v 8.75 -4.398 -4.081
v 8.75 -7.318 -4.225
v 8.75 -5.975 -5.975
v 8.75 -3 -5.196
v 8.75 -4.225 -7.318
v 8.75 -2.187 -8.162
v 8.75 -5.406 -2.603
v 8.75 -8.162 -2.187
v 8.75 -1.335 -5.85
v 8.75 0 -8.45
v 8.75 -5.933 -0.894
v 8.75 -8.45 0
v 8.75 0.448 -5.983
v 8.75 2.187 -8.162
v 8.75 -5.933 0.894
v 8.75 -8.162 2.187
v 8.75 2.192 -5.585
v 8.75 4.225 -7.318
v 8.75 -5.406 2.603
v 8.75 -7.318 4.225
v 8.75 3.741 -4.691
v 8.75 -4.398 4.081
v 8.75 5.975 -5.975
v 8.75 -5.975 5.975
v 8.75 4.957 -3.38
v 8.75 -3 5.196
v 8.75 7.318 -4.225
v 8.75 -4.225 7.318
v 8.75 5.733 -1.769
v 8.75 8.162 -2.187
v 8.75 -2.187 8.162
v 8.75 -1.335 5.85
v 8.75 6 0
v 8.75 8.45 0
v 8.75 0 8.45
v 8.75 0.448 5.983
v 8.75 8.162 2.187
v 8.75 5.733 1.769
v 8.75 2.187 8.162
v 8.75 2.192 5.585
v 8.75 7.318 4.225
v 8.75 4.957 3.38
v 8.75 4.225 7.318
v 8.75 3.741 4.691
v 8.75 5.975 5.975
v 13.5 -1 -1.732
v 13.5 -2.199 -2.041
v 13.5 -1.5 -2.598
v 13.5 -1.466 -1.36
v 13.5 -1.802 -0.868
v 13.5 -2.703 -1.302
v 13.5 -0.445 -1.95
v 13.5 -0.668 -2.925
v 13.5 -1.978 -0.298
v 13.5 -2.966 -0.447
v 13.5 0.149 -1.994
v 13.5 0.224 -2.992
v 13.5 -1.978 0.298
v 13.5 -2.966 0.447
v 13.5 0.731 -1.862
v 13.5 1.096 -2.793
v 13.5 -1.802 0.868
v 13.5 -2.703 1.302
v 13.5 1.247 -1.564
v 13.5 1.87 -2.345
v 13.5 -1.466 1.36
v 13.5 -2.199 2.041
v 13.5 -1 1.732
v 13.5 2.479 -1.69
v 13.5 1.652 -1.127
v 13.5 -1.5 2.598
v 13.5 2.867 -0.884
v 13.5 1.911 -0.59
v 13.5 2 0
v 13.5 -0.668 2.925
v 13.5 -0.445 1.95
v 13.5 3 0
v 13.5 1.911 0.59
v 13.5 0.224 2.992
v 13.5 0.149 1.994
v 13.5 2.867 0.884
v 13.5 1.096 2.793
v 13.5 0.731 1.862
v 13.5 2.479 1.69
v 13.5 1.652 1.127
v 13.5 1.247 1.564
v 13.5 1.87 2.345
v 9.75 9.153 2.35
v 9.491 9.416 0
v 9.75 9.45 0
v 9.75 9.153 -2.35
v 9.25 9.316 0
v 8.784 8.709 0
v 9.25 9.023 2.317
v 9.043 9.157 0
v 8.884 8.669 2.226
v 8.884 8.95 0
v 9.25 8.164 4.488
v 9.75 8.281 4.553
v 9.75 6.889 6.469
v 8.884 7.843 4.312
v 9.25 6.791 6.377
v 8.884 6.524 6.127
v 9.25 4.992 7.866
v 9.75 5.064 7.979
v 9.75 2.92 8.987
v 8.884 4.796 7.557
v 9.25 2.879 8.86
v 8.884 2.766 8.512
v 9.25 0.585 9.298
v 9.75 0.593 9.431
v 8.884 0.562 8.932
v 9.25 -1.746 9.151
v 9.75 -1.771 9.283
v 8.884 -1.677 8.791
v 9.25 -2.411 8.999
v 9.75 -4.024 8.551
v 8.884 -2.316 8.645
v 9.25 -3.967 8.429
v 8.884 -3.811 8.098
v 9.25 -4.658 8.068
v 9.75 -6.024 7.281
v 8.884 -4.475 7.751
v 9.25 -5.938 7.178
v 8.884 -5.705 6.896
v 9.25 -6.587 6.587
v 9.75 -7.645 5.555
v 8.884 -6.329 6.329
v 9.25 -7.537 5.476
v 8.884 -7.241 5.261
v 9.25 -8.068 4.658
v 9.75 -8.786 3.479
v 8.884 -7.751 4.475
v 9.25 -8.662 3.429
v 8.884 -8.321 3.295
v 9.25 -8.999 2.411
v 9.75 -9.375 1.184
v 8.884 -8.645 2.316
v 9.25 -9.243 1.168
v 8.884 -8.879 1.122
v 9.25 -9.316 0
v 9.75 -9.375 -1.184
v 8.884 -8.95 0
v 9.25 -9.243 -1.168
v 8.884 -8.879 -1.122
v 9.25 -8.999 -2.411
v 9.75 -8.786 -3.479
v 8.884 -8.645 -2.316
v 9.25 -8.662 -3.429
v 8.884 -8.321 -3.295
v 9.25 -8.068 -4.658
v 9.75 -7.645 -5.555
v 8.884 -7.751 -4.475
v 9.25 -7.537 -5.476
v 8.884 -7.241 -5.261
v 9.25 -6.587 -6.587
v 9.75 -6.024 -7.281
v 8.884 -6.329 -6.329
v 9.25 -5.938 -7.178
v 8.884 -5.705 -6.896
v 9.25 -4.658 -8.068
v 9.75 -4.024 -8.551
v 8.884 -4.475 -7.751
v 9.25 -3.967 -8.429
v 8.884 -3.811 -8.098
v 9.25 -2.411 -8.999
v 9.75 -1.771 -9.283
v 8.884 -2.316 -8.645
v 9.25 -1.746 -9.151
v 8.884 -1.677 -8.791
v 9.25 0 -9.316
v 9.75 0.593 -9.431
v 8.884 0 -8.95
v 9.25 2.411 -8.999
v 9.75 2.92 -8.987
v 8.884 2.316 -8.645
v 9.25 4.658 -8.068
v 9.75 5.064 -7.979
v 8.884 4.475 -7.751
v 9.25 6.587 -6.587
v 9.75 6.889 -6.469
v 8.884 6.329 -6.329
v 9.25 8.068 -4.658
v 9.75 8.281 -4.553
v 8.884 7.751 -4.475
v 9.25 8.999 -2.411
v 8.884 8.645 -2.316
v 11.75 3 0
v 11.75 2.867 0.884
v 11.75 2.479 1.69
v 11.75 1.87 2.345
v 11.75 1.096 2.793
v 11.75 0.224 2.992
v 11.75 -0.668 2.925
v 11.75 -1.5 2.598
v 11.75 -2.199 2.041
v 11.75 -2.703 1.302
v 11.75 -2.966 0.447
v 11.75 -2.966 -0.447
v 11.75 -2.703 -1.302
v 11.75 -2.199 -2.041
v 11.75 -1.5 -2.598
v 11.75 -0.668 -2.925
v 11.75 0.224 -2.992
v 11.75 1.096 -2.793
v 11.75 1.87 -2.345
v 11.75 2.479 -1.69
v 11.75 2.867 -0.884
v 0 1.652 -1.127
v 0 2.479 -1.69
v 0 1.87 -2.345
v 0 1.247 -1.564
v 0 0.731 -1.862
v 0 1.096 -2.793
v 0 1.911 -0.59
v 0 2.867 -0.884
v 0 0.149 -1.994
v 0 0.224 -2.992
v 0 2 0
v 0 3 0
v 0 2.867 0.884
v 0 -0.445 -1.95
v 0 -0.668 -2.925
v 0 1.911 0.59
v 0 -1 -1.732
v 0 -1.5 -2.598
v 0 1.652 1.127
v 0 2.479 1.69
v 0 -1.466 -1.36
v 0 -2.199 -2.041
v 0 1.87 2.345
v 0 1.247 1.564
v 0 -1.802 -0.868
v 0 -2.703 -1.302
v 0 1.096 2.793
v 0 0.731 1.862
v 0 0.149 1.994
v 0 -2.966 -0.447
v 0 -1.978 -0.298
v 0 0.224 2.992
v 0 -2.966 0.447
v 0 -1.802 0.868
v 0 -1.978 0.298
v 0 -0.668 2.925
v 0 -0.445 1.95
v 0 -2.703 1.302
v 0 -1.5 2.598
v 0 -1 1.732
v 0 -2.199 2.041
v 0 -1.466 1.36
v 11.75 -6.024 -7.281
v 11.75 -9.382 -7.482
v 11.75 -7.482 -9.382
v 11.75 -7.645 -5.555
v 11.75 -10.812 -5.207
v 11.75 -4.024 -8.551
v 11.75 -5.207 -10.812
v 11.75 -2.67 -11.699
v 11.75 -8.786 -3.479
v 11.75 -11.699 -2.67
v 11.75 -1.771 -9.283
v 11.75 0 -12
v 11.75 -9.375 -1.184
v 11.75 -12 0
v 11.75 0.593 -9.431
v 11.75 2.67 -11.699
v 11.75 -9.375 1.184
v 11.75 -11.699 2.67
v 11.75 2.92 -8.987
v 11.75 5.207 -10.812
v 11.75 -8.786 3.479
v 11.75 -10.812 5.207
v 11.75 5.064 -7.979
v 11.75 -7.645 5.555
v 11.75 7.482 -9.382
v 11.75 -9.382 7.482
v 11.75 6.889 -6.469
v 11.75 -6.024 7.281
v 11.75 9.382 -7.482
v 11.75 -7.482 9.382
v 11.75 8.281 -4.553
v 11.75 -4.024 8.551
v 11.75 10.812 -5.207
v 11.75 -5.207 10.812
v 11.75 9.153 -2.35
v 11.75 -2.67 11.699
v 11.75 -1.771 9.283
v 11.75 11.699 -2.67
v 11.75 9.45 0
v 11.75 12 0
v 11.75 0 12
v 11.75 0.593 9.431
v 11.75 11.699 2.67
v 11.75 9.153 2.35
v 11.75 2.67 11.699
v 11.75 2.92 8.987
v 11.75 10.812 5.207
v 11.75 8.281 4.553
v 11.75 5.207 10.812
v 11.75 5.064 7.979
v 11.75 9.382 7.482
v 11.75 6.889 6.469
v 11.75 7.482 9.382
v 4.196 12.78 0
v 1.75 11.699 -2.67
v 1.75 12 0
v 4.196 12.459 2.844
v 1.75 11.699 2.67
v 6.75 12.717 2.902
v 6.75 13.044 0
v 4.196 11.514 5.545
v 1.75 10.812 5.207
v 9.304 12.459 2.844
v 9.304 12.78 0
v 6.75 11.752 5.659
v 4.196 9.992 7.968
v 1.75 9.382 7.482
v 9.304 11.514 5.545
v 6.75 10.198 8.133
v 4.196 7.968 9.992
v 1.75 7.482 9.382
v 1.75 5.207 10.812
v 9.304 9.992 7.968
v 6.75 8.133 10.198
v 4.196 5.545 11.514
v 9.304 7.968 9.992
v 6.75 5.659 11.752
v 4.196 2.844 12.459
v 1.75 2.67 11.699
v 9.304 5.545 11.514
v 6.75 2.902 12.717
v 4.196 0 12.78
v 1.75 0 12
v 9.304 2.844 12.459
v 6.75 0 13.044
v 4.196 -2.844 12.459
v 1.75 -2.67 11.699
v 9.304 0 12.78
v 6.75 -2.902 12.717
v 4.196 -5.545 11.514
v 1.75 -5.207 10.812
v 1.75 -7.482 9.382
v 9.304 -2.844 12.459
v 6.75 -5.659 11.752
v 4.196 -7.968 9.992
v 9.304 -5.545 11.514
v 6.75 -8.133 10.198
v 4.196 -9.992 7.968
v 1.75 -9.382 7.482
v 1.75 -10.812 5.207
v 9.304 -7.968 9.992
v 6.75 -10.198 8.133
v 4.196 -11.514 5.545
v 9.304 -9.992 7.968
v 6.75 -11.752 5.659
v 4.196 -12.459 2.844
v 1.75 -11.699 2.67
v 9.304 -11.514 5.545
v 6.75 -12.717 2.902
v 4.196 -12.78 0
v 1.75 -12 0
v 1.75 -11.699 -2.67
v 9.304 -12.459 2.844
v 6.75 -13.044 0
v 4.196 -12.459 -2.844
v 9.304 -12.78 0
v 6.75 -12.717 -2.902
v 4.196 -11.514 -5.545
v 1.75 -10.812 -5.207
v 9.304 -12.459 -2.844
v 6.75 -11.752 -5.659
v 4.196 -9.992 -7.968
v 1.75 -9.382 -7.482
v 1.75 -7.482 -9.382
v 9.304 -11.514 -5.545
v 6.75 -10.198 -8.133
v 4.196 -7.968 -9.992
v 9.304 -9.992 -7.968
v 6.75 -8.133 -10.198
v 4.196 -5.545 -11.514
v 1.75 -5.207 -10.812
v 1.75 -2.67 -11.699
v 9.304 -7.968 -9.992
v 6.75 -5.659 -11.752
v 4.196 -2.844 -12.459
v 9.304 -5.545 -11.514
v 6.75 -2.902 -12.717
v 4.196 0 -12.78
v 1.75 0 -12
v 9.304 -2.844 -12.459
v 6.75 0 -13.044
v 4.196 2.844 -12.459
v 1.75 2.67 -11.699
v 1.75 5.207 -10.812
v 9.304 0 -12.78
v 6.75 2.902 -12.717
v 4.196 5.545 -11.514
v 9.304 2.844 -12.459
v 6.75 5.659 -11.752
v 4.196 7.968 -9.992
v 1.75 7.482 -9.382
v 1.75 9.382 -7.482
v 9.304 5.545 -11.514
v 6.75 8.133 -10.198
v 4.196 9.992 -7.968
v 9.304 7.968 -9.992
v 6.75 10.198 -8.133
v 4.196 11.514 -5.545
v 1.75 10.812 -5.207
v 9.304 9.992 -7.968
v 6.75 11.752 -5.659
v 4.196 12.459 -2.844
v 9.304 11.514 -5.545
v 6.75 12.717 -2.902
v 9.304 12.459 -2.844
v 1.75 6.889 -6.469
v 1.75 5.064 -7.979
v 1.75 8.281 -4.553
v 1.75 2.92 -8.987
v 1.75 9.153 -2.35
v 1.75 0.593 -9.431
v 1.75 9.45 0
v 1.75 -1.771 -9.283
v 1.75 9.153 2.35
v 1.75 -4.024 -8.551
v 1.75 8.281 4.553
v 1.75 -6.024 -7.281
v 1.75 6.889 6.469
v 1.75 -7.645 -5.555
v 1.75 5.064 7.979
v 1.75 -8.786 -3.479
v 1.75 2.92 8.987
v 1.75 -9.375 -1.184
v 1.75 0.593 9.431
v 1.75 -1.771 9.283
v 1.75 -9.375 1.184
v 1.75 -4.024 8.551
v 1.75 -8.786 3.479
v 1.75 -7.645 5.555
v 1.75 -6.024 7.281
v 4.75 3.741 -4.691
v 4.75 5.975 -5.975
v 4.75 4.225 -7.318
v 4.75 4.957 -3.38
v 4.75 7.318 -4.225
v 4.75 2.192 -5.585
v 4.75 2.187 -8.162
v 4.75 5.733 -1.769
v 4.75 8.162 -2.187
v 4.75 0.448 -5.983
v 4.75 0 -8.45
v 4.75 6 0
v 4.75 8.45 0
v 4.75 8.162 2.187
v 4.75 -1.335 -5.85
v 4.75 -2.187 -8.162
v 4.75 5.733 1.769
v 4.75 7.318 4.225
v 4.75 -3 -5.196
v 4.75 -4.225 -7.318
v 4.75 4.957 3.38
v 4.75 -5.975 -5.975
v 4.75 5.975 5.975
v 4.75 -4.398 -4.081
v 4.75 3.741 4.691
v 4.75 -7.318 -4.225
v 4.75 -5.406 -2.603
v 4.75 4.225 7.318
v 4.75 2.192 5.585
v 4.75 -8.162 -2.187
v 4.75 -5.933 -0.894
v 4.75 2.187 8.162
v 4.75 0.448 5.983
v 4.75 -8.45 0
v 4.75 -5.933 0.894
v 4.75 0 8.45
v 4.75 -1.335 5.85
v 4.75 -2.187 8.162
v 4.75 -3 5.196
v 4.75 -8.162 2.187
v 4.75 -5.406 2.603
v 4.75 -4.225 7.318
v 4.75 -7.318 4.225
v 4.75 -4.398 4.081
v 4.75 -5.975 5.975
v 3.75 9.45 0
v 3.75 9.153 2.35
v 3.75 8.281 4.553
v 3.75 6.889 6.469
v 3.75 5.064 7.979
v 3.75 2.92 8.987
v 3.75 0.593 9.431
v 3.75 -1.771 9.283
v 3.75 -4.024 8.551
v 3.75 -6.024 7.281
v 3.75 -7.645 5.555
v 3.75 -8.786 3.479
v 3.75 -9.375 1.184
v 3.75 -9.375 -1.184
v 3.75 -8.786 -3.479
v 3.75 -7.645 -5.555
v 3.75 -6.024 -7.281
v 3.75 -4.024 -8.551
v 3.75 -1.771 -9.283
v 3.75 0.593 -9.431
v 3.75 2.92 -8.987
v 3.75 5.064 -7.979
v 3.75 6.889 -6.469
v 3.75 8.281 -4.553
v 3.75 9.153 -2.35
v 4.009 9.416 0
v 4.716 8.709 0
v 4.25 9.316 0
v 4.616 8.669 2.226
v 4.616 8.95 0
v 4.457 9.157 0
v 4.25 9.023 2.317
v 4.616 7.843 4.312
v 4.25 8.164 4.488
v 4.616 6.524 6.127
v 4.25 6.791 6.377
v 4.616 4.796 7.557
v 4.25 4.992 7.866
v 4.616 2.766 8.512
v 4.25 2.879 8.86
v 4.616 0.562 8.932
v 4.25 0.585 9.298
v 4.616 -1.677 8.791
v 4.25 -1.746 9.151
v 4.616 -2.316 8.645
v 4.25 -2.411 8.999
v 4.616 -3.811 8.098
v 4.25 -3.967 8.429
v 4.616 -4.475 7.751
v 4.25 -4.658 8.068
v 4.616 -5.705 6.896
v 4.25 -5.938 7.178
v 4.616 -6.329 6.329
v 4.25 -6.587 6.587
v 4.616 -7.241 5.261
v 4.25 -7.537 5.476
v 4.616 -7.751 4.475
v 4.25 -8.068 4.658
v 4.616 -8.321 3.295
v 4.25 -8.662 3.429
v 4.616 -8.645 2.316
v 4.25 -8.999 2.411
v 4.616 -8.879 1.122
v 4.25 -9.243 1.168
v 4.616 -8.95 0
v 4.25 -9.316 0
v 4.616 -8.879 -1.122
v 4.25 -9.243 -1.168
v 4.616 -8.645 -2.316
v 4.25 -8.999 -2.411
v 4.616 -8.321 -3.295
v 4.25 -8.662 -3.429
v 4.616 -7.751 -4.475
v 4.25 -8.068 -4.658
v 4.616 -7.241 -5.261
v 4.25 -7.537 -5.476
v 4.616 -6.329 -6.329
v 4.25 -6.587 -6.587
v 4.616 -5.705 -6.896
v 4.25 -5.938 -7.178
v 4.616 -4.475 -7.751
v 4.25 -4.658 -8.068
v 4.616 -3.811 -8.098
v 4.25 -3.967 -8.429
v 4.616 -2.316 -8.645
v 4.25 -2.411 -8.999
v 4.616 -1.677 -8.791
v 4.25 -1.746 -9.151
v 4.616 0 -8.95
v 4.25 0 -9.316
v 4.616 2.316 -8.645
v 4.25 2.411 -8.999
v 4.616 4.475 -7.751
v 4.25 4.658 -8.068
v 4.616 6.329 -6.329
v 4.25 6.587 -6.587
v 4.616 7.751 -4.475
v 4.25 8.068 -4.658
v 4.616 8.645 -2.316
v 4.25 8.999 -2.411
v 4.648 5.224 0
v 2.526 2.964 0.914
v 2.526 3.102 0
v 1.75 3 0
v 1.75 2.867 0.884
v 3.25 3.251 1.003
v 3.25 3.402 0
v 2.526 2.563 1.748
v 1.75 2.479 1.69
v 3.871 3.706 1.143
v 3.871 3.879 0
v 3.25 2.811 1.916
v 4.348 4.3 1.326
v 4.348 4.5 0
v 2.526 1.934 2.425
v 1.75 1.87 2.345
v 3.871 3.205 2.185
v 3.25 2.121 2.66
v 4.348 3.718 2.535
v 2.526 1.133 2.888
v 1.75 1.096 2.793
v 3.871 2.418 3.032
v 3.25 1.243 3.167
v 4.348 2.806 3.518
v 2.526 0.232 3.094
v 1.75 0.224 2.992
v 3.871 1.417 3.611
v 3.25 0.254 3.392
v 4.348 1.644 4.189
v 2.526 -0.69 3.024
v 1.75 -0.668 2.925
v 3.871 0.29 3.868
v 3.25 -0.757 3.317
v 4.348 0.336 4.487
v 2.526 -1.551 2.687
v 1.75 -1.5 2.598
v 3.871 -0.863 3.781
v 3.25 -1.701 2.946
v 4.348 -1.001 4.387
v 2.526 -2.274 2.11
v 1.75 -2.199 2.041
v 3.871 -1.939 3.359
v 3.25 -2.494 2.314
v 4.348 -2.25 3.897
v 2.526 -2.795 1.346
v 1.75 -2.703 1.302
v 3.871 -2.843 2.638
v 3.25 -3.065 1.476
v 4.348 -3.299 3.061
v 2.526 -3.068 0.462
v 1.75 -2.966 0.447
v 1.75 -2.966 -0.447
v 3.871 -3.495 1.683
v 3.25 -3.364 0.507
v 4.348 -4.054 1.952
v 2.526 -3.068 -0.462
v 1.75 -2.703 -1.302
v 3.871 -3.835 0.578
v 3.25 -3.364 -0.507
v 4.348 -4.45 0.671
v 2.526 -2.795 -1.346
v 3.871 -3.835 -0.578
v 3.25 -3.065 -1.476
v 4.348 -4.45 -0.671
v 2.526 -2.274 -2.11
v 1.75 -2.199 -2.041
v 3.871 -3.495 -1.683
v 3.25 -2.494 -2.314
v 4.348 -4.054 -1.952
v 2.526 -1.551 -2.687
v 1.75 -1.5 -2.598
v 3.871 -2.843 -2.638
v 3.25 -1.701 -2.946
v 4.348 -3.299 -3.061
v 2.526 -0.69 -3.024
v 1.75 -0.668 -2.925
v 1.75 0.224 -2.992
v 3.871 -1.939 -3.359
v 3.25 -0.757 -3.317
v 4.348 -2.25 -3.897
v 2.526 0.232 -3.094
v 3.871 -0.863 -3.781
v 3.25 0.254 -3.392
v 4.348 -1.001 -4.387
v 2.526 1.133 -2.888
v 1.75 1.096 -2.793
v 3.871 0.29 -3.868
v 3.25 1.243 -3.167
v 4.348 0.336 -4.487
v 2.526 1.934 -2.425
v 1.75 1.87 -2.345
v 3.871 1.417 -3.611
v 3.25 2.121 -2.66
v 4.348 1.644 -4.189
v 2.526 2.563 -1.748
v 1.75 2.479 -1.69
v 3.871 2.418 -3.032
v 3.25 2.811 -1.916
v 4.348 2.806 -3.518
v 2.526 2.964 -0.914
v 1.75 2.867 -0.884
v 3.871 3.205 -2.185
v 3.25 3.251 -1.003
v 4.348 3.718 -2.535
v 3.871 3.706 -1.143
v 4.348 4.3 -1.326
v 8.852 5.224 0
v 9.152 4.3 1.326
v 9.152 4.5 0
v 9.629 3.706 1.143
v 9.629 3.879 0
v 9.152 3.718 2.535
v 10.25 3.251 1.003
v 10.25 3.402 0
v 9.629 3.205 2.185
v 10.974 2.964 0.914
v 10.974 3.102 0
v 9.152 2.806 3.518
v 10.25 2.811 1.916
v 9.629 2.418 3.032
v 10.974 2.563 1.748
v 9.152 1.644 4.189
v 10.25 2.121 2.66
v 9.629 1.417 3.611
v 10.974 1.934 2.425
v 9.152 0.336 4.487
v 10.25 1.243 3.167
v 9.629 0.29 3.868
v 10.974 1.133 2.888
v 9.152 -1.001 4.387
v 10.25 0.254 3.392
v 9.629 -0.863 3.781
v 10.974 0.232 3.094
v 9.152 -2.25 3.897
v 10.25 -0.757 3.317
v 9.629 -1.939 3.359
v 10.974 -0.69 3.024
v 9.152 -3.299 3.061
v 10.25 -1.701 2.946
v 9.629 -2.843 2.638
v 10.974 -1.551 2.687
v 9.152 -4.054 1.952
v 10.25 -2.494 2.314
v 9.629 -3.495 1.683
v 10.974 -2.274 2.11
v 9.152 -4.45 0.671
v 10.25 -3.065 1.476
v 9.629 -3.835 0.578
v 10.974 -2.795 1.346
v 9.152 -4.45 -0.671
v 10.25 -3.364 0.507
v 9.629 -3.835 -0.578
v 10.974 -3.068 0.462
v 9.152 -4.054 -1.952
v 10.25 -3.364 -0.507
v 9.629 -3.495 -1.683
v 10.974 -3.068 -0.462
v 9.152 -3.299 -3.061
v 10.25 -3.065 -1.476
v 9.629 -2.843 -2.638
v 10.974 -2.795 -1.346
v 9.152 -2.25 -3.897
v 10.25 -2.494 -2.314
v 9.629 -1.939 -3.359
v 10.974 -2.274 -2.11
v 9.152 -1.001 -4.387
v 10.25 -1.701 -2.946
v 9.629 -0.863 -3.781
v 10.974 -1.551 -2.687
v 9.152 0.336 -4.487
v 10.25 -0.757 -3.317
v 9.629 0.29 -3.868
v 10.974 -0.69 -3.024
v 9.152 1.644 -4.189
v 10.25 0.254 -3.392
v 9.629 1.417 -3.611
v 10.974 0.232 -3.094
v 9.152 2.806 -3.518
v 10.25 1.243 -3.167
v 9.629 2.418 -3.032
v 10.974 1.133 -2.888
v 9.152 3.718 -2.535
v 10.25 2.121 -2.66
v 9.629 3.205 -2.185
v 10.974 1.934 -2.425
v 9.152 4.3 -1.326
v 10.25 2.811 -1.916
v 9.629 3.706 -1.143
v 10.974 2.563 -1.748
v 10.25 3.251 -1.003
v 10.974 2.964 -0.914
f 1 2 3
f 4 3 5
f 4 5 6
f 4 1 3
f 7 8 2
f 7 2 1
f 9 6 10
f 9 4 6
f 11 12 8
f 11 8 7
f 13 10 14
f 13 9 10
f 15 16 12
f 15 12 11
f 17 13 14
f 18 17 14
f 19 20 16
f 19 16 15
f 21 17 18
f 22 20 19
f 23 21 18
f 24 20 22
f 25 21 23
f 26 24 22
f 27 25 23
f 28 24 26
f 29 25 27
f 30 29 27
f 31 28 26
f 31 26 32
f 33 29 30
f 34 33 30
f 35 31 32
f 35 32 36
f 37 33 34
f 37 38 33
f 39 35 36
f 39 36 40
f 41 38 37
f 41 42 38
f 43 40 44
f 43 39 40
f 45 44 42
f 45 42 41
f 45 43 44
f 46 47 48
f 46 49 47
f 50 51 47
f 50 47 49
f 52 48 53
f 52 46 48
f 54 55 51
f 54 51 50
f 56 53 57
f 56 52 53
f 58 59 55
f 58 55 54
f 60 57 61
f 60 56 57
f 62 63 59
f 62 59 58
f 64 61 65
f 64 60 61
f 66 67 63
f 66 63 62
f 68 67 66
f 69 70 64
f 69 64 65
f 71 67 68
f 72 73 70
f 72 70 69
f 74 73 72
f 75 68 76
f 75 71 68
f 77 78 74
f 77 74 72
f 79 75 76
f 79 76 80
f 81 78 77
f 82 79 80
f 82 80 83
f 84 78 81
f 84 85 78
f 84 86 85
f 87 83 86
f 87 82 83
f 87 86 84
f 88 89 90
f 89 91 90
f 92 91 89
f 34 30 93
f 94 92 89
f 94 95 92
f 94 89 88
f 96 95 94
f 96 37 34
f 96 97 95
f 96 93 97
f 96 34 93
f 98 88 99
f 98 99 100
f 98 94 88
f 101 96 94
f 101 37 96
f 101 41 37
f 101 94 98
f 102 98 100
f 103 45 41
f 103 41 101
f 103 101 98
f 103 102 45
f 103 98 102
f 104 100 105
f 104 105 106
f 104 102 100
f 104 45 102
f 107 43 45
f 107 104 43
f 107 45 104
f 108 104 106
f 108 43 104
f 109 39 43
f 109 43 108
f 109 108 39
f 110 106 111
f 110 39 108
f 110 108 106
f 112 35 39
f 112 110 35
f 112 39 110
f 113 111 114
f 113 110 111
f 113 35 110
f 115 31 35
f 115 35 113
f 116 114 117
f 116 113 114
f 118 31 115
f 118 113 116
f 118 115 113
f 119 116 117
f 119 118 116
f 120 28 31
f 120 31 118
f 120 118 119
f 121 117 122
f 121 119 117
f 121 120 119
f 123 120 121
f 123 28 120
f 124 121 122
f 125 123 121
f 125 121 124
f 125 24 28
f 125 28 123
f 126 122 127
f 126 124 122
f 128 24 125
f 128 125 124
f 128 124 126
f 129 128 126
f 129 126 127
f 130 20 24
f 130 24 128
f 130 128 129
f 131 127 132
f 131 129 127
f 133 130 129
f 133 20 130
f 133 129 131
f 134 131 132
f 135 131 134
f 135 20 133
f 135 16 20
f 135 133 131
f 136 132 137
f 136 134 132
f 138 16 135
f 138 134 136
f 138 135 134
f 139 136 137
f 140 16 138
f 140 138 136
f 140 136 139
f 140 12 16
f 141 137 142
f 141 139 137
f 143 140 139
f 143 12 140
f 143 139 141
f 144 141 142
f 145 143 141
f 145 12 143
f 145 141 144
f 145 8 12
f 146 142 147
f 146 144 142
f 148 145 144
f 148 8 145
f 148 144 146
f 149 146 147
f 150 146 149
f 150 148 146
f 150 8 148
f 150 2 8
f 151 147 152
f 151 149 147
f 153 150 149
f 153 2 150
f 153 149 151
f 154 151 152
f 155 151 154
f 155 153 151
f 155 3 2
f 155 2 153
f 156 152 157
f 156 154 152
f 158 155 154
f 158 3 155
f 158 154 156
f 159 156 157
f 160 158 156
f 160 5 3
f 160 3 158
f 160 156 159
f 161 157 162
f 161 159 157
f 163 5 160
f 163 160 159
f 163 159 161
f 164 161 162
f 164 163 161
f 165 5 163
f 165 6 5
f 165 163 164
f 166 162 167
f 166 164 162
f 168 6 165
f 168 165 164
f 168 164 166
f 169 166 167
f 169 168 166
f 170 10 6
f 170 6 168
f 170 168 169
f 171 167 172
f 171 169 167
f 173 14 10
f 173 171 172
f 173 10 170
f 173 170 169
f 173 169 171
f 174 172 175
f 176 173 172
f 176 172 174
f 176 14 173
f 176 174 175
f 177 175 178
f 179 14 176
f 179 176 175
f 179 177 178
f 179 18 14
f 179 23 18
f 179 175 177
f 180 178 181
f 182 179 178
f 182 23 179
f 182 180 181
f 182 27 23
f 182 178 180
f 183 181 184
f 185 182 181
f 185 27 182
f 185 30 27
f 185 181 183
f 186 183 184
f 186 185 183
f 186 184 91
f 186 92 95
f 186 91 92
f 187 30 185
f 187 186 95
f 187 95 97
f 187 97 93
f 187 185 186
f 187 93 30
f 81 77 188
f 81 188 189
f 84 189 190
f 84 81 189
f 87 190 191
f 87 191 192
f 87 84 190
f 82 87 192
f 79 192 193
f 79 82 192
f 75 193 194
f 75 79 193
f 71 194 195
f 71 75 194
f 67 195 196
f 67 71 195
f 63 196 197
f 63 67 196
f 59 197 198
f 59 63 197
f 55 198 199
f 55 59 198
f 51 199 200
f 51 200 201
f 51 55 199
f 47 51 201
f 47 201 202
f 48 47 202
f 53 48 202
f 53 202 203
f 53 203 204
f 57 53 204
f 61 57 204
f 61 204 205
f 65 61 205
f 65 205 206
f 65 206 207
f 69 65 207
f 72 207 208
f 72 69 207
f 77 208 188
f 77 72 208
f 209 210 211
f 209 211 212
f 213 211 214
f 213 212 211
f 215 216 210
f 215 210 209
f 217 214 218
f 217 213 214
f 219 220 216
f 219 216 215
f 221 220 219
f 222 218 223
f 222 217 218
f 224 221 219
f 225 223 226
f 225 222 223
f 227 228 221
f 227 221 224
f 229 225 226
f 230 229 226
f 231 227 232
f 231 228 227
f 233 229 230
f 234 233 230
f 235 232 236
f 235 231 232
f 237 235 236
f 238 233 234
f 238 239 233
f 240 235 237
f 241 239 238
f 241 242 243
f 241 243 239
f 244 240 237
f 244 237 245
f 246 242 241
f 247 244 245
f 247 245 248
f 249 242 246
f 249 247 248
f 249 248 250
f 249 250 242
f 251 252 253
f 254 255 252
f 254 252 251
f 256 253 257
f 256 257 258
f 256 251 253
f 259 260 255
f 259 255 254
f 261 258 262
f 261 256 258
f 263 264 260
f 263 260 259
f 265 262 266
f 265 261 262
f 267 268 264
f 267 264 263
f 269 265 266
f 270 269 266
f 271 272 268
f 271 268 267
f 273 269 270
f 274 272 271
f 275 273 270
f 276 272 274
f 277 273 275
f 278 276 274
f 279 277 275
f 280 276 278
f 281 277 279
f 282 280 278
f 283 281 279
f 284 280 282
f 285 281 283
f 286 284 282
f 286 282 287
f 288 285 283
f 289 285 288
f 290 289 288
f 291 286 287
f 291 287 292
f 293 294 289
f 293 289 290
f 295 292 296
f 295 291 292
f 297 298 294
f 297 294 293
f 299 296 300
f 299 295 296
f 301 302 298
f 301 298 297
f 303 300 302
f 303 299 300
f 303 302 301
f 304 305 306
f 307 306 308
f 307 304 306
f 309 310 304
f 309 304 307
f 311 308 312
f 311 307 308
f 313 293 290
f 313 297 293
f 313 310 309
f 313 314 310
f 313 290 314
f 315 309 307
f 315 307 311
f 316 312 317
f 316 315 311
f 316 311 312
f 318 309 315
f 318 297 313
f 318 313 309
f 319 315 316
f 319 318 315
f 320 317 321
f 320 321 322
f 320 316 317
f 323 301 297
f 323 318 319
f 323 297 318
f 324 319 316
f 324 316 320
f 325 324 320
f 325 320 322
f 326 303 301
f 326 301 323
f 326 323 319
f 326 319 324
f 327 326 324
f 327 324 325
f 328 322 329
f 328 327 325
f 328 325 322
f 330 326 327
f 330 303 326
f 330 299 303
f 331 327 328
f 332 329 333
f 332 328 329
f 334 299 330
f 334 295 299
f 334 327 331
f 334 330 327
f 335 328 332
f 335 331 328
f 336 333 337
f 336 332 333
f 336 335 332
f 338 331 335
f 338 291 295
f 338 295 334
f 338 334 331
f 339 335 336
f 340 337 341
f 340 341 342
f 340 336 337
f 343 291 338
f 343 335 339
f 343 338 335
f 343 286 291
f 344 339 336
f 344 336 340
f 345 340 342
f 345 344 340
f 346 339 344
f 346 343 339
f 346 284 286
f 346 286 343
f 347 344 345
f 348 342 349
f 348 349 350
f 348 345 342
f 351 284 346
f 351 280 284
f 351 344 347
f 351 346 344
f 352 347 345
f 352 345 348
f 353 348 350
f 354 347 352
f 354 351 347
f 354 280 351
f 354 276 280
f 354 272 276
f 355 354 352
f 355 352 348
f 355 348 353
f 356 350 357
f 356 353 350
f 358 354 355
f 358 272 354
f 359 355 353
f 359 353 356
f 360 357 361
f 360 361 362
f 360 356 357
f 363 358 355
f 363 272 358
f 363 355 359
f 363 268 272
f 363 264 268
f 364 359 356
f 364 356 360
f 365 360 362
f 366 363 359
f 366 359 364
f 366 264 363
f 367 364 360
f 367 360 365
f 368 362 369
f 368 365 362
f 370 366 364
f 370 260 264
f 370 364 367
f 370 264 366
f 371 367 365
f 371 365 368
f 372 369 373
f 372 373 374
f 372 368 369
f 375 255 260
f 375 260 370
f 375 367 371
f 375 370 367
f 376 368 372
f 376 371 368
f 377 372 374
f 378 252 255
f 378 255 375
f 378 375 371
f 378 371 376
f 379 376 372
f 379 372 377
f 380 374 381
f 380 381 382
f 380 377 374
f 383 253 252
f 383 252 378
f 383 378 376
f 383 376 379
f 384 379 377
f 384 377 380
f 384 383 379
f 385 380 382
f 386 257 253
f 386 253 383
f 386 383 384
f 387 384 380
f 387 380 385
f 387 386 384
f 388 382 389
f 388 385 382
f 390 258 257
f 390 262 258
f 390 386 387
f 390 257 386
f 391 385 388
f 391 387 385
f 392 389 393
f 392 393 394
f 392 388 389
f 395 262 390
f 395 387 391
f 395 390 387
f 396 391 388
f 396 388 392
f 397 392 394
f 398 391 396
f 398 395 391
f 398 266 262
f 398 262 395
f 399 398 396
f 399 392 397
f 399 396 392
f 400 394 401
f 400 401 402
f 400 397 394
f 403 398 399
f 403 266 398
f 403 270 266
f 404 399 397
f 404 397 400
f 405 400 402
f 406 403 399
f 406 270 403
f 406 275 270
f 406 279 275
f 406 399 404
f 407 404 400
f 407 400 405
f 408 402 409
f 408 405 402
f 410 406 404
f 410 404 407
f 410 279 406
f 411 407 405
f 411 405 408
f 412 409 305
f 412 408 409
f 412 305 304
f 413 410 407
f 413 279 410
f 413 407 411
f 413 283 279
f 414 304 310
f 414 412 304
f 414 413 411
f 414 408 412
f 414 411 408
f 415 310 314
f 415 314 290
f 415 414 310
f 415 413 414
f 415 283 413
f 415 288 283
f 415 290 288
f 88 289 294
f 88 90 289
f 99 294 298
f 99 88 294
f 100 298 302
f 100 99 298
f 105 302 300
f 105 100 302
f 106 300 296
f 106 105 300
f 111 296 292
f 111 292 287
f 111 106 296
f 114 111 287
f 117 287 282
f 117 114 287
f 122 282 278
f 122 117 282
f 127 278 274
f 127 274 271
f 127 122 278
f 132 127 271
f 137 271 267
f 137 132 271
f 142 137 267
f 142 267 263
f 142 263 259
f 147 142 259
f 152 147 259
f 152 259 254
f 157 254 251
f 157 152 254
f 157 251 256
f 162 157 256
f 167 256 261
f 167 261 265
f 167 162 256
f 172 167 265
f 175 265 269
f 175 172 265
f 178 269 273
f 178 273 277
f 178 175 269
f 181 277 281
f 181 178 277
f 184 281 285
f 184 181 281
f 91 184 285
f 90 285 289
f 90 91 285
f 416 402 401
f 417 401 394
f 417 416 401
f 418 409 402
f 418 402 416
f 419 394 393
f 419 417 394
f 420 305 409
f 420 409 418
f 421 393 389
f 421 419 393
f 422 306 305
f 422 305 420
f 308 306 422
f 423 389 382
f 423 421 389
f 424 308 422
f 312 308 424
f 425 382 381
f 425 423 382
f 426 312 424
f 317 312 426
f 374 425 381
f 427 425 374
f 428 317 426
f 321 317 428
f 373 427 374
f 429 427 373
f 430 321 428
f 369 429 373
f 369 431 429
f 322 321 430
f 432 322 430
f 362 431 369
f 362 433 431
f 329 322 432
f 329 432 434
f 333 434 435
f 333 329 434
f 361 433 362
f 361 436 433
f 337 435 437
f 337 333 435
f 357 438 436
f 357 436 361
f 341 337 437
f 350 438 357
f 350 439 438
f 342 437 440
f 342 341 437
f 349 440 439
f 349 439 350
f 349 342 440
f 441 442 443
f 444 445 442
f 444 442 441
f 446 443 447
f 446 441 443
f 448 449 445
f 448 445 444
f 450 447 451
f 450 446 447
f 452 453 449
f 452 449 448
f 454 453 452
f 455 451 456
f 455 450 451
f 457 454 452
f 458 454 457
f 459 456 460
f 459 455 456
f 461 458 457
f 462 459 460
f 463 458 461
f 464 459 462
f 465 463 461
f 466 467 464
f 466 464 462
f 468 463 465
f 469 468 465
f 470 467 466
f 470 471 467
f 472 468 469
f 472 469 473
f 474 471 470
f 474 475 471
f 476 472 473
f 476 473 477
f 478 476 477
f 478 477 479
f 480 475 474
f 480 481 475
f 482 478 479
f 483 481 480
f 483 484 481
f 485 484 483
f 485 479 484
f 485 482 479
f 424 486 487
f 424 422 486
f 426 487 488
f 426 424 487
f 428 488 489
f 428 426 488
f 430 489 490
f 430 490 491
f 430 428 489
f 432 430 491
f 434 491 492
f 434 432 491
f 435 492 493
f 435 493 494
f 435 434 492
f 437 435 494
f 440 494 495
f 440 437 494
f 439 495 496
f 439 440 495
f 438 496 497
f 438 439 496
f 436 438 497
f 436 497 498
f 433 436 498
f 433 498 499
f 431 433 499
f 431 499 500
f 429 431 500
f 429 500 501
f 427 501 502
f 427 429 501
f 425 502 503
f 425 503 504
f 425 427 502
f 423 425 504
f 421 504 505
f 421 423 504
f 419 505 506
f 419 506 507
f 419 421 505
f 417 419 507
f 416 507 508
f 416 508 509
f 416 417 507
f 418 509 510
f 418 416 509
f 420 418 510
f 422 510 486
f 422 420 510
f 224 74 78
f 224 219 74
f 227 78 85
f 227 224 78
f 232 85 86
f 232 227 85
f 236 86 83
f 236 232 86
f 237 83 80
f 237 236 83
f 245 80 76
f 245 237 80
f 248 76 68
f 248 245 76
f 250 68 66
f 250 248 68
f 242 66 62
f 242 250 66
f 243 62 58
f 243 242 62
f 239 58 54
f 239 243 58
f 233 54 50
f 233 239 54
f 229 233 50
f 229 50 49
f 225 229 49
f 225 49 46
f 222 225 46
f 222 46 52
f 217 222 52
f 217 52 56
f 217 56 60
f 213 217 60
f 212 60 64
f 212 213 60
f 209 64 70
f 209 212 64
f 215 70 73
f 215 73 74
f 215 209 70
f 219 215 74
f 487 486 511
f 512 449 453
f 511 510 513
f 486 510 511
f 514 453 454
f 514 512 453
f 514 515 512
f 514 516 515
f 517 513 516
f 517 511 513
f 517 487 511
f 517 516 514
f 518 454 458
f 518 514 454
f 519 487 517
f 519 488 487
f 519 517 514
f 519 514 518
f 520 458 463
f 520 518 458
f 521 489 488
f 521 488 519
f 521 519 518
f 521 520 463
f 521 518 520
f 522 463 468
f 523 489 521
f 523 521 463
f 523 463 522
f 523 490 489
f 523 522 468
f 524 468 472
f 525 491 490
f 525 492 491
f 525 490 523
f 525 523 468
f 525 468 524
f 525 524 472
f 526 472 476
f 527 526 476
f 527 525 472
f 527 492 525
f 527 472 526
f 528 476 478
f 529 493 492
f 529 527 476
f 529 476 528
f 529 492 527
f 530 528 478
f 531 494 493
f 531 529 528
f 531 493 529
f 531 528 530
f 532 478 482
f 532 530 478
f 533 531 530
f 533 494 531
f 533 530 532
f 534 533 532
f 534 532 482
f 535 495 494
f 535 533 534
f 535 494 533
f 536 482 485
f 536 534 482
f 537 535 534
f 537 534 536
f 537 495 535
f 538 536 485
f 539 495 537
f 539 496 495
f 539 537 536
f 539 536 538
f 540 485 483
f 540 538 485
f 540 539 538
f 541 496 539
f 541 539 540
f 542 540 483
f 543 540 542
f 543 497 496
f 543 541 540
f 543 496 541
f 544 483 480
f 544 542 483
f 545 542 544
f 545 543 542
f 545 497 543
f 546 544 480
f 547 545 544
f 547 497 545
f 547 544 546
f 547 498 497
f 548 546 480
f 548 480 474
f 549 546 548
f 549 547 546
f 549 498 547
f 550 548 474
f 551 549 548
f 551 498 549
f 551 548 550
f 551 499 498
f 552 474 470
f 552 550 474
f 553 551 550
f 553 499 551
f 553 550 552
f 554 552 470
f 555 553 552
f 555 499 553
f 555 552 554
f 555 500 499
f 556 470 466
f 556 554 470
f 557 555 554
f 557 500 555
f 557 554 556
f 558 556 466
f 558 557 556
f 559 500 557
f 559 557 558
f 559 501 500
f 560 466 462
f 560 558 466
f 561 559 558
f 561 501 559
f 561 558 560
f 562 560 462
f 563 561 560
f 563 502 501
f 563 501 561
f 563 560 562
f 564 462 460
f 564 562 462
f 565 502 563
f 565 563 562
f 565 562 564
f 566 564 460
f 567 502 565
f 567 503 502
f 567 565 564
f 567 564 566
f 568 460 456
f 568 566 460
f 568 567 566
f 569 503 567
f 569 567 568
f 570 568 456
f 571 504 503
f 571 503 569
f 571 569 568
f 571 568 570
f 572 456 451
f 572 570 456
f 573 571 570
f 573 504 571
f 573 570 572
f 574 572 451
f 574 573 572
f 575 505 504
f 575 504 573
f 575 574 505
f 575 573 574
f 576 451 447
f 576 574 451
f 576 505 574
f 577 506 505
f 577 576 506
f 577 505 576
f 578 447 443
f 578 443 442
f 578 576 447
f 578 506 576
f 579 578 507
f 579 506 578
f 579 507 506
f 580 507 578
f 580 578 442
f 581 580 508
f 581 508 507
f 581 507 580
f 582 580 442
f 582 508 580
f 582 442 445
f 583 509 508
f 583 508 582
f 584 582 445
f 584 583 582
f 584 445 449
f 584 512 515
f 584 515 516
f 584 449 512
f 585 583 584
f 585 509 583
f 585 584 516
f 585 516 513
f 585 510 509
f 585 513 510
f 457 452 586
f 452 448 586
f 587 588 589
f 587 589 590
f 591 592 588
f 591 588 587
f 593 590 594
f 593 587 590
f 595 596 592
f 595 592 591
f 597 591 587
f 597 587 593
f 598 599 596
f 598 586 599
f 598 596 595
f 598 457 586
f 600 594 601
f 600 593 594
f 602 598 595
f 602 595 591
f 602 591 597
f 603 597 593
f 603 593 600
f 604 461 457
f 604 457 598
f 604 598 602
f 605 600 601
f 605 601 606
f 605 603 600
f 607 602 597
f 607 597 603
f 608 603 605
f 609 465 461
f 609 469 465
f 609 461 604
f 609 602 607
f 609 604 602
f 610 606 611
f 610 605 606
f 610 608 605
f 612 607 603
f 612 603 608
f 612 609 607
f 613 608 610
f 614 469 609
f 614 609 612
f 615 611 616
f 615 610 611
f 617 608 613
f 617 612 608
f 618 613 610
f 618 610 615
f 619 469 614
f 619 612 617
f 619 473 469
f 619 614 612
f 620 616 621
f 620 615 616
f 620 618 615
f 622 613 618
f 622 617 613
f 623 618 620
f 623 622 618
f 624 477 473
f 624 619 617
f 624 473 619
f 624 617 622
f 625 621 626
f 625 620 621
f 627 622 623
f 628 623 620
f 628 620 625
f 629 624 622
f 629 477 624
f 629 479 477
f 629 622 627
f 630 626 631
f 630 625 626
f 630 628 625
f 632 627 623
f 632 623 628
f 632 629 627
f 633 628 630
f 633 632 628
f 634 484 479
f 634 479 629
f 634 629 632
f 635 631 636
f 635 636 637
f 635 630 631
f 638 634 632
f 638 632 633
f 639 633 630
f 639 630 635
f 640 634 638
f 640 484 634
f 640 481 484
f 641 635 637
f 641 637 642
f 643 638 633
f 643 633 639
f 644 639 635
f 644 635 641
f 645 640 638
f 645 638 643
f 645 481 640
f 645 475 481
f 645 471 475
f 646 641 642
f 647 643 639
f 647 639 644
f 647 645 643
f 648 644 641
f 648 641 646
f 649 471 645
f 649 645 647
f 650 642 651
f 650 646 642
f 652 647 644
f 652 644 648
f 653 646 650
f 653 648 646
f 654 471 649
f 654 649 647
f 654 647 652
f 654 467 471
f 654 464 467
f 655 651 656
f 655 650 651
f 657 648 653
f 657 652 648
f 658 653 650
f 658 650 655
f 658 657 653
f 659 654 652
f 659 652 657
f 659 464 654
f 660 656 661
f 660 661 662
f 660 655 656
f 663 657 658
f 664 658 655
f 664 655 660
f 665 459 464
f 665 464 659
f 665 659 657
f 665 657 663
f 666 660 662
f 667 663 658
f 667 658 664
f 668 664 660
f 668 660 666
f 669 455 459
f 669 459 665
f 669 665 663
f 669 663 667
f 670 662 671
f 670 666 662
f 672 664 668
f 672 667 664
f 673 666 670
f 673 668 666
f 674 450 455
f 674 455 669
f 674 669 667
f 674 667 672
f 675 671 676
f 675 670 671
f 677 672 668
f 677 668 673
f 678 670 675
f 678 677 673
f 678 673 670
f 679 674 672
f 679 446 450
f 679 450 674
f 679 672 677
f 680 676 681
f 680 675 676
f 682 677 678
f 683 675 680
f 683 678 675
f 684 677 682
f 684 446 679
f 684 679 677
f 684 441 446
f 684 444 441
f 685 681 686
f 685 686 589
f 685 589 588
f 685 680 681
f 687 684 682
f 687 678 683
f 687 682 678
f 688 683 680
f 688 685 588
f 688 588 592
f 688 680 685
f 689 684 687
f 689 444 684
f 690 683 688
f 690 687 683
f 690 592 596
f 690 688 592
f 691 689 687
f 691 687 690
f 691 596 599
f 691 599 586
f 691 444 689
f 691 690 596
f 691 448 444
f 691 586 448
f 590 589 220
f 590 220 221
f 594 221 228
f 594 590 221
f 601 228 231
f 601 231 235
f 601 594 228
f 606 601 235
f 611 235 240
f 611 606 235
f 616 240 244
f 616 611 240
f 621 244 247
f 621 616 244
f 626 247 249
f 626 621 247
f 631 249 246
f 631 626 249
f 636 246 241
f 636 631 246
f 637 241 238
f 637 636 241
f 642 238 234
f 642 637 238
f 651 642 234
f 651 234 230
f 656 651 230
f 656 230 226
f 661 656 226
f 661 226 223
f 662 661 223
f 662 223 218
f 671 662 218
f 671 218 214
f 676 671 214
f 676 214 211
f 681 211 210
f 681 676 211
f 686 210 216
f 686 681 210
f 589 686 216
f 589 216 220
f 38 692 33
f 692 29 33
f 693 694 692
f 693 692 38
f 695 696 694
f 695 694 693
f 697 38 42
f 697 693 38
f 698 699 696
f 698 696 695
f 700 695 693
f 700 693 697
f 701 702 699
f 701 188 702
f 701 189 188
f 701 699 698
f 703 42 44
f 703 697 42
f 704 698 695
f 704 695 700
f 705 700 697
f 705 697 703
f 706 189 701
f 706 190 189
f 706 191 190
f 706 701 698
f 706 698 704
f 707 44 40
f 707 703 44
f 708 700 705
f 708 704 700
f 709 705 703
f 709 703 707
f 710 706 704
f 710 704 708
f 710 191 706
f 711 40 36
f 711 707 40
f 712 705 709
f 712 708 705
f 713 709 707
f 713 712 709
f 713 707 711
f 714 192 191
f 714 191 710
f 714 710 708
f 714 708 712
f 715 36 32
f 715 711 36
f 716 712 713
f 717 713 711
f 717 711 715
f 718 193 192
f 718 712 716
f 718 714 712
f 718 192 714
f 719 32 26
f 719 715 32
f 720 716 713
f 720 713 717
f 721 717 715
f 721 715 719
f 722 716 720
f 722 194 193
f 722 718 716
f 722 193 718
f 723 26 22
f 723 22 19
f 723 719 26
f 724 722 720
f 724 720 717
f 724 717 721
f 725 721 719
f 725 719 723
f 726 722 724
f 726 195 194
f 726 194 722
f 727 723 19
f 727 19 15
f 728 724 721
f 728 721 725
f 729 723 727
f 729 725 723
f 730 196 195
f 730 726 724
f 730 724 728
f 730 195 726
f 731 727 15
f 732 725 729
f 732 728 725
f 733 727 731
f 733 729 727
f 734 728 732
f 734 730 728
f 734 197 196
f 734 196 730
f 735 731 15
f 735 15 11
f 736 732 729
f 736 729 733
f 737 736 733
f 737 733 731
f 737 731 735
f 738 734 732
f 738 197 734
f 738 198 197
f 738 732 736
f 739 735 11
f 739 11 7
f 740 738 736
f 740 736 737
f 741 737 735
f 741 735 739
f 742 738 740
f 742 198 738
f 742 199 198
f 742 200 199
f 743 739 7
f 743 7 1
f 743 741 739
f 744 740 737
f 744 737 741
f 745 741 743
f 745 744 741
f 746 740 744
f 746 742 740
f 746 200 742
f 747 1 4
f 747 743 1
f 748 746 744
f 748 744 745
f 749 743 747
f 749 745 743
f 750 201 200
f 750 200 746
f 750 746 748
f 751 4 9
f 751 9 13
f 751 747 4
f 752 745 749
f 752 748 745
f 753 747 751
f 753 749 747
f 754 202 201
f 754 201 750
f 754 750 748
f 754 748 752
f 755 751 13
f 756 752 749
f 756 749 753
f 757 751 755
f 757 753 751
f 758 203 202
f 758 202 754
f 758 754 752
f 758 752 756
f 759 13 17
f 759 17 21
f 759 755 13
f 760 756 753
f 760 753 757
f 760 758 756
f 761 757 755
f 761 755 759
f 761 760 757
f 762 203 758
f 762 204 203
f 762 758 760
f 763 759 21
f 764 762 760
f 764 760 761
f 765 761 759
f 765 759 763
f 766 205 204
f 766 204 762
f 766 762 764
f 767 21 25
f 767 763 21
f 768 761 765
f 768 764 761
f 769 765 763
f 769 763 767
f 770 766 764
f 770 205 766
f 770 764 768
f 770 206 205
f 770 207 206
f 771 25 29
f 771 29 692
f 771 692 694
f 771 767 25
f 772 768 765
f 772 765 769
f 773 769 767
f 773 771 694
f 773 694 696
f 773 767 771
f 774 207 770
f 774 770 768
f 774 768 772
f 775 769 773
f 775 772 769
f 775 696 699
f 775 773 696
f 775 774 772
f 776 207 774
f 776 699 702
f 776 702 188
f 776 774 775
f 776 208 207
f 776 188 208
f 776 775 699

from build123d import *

# Parameters (mm, degrees)
FILLET1_R    = 6
SCALE1_SCALE = 0.5


with BuildPart() as part:
    # Sketch1 → Revolve1 (revolve)
    with BuildSketch(Plane.XY):
        with BuildLine():
            Line((0, 4), (0, 6))
            Line((0, 6), (3.5, 6))
            Line((3.5, 6), (9.5, 6))
            Line((9.5, 6), (9.5, 16.9))
            ThreePointArc((9.5, 16.9), (8.914213562, 18.314213562), (7.5, 18.9))
            Line((7.5, 18.9), (3.5, 18.9))
            Line((3.5, 18.9), (3.5, 24))
            ThreePointArc((3.5, 24), (13.5, 26.087121525), (23.5, 24))
            Line((23.5, 24), (23.5, 18.9))
            Line((23.5, 18.9), (19.5, 18.9))
            ThreePointArc((19.5, 18.9), (18.085786438, 18.314213562), (17.5, 16.9))
            Line((17.5, 16.9), (17.5, 6))
            Line((17.5, 6), (23.5, 6))
            Line((23.5, 6), (27, 6))
            Line((27, 6), (27, 4))
            Line((27, 4), (0, 4))
        make_face()
    revolve(axis=Axis((0, 0, 0), (1, 0, 0)))

    # Fillet1
    fillet1_edges = [part.edges().sort_by_distance(p)[0] for p in [
        (9.5, -6, 0),
        (17.5, -6, 0),
    ]]
    fillet(fillet1_edges, radius=FILLET1_R)


with BuildPart() as part_1:
    # Scale1: scaled about (0, 0, 0)
    add(part.part.scale(SCALE1_SCALE))


solid = part_1.part
